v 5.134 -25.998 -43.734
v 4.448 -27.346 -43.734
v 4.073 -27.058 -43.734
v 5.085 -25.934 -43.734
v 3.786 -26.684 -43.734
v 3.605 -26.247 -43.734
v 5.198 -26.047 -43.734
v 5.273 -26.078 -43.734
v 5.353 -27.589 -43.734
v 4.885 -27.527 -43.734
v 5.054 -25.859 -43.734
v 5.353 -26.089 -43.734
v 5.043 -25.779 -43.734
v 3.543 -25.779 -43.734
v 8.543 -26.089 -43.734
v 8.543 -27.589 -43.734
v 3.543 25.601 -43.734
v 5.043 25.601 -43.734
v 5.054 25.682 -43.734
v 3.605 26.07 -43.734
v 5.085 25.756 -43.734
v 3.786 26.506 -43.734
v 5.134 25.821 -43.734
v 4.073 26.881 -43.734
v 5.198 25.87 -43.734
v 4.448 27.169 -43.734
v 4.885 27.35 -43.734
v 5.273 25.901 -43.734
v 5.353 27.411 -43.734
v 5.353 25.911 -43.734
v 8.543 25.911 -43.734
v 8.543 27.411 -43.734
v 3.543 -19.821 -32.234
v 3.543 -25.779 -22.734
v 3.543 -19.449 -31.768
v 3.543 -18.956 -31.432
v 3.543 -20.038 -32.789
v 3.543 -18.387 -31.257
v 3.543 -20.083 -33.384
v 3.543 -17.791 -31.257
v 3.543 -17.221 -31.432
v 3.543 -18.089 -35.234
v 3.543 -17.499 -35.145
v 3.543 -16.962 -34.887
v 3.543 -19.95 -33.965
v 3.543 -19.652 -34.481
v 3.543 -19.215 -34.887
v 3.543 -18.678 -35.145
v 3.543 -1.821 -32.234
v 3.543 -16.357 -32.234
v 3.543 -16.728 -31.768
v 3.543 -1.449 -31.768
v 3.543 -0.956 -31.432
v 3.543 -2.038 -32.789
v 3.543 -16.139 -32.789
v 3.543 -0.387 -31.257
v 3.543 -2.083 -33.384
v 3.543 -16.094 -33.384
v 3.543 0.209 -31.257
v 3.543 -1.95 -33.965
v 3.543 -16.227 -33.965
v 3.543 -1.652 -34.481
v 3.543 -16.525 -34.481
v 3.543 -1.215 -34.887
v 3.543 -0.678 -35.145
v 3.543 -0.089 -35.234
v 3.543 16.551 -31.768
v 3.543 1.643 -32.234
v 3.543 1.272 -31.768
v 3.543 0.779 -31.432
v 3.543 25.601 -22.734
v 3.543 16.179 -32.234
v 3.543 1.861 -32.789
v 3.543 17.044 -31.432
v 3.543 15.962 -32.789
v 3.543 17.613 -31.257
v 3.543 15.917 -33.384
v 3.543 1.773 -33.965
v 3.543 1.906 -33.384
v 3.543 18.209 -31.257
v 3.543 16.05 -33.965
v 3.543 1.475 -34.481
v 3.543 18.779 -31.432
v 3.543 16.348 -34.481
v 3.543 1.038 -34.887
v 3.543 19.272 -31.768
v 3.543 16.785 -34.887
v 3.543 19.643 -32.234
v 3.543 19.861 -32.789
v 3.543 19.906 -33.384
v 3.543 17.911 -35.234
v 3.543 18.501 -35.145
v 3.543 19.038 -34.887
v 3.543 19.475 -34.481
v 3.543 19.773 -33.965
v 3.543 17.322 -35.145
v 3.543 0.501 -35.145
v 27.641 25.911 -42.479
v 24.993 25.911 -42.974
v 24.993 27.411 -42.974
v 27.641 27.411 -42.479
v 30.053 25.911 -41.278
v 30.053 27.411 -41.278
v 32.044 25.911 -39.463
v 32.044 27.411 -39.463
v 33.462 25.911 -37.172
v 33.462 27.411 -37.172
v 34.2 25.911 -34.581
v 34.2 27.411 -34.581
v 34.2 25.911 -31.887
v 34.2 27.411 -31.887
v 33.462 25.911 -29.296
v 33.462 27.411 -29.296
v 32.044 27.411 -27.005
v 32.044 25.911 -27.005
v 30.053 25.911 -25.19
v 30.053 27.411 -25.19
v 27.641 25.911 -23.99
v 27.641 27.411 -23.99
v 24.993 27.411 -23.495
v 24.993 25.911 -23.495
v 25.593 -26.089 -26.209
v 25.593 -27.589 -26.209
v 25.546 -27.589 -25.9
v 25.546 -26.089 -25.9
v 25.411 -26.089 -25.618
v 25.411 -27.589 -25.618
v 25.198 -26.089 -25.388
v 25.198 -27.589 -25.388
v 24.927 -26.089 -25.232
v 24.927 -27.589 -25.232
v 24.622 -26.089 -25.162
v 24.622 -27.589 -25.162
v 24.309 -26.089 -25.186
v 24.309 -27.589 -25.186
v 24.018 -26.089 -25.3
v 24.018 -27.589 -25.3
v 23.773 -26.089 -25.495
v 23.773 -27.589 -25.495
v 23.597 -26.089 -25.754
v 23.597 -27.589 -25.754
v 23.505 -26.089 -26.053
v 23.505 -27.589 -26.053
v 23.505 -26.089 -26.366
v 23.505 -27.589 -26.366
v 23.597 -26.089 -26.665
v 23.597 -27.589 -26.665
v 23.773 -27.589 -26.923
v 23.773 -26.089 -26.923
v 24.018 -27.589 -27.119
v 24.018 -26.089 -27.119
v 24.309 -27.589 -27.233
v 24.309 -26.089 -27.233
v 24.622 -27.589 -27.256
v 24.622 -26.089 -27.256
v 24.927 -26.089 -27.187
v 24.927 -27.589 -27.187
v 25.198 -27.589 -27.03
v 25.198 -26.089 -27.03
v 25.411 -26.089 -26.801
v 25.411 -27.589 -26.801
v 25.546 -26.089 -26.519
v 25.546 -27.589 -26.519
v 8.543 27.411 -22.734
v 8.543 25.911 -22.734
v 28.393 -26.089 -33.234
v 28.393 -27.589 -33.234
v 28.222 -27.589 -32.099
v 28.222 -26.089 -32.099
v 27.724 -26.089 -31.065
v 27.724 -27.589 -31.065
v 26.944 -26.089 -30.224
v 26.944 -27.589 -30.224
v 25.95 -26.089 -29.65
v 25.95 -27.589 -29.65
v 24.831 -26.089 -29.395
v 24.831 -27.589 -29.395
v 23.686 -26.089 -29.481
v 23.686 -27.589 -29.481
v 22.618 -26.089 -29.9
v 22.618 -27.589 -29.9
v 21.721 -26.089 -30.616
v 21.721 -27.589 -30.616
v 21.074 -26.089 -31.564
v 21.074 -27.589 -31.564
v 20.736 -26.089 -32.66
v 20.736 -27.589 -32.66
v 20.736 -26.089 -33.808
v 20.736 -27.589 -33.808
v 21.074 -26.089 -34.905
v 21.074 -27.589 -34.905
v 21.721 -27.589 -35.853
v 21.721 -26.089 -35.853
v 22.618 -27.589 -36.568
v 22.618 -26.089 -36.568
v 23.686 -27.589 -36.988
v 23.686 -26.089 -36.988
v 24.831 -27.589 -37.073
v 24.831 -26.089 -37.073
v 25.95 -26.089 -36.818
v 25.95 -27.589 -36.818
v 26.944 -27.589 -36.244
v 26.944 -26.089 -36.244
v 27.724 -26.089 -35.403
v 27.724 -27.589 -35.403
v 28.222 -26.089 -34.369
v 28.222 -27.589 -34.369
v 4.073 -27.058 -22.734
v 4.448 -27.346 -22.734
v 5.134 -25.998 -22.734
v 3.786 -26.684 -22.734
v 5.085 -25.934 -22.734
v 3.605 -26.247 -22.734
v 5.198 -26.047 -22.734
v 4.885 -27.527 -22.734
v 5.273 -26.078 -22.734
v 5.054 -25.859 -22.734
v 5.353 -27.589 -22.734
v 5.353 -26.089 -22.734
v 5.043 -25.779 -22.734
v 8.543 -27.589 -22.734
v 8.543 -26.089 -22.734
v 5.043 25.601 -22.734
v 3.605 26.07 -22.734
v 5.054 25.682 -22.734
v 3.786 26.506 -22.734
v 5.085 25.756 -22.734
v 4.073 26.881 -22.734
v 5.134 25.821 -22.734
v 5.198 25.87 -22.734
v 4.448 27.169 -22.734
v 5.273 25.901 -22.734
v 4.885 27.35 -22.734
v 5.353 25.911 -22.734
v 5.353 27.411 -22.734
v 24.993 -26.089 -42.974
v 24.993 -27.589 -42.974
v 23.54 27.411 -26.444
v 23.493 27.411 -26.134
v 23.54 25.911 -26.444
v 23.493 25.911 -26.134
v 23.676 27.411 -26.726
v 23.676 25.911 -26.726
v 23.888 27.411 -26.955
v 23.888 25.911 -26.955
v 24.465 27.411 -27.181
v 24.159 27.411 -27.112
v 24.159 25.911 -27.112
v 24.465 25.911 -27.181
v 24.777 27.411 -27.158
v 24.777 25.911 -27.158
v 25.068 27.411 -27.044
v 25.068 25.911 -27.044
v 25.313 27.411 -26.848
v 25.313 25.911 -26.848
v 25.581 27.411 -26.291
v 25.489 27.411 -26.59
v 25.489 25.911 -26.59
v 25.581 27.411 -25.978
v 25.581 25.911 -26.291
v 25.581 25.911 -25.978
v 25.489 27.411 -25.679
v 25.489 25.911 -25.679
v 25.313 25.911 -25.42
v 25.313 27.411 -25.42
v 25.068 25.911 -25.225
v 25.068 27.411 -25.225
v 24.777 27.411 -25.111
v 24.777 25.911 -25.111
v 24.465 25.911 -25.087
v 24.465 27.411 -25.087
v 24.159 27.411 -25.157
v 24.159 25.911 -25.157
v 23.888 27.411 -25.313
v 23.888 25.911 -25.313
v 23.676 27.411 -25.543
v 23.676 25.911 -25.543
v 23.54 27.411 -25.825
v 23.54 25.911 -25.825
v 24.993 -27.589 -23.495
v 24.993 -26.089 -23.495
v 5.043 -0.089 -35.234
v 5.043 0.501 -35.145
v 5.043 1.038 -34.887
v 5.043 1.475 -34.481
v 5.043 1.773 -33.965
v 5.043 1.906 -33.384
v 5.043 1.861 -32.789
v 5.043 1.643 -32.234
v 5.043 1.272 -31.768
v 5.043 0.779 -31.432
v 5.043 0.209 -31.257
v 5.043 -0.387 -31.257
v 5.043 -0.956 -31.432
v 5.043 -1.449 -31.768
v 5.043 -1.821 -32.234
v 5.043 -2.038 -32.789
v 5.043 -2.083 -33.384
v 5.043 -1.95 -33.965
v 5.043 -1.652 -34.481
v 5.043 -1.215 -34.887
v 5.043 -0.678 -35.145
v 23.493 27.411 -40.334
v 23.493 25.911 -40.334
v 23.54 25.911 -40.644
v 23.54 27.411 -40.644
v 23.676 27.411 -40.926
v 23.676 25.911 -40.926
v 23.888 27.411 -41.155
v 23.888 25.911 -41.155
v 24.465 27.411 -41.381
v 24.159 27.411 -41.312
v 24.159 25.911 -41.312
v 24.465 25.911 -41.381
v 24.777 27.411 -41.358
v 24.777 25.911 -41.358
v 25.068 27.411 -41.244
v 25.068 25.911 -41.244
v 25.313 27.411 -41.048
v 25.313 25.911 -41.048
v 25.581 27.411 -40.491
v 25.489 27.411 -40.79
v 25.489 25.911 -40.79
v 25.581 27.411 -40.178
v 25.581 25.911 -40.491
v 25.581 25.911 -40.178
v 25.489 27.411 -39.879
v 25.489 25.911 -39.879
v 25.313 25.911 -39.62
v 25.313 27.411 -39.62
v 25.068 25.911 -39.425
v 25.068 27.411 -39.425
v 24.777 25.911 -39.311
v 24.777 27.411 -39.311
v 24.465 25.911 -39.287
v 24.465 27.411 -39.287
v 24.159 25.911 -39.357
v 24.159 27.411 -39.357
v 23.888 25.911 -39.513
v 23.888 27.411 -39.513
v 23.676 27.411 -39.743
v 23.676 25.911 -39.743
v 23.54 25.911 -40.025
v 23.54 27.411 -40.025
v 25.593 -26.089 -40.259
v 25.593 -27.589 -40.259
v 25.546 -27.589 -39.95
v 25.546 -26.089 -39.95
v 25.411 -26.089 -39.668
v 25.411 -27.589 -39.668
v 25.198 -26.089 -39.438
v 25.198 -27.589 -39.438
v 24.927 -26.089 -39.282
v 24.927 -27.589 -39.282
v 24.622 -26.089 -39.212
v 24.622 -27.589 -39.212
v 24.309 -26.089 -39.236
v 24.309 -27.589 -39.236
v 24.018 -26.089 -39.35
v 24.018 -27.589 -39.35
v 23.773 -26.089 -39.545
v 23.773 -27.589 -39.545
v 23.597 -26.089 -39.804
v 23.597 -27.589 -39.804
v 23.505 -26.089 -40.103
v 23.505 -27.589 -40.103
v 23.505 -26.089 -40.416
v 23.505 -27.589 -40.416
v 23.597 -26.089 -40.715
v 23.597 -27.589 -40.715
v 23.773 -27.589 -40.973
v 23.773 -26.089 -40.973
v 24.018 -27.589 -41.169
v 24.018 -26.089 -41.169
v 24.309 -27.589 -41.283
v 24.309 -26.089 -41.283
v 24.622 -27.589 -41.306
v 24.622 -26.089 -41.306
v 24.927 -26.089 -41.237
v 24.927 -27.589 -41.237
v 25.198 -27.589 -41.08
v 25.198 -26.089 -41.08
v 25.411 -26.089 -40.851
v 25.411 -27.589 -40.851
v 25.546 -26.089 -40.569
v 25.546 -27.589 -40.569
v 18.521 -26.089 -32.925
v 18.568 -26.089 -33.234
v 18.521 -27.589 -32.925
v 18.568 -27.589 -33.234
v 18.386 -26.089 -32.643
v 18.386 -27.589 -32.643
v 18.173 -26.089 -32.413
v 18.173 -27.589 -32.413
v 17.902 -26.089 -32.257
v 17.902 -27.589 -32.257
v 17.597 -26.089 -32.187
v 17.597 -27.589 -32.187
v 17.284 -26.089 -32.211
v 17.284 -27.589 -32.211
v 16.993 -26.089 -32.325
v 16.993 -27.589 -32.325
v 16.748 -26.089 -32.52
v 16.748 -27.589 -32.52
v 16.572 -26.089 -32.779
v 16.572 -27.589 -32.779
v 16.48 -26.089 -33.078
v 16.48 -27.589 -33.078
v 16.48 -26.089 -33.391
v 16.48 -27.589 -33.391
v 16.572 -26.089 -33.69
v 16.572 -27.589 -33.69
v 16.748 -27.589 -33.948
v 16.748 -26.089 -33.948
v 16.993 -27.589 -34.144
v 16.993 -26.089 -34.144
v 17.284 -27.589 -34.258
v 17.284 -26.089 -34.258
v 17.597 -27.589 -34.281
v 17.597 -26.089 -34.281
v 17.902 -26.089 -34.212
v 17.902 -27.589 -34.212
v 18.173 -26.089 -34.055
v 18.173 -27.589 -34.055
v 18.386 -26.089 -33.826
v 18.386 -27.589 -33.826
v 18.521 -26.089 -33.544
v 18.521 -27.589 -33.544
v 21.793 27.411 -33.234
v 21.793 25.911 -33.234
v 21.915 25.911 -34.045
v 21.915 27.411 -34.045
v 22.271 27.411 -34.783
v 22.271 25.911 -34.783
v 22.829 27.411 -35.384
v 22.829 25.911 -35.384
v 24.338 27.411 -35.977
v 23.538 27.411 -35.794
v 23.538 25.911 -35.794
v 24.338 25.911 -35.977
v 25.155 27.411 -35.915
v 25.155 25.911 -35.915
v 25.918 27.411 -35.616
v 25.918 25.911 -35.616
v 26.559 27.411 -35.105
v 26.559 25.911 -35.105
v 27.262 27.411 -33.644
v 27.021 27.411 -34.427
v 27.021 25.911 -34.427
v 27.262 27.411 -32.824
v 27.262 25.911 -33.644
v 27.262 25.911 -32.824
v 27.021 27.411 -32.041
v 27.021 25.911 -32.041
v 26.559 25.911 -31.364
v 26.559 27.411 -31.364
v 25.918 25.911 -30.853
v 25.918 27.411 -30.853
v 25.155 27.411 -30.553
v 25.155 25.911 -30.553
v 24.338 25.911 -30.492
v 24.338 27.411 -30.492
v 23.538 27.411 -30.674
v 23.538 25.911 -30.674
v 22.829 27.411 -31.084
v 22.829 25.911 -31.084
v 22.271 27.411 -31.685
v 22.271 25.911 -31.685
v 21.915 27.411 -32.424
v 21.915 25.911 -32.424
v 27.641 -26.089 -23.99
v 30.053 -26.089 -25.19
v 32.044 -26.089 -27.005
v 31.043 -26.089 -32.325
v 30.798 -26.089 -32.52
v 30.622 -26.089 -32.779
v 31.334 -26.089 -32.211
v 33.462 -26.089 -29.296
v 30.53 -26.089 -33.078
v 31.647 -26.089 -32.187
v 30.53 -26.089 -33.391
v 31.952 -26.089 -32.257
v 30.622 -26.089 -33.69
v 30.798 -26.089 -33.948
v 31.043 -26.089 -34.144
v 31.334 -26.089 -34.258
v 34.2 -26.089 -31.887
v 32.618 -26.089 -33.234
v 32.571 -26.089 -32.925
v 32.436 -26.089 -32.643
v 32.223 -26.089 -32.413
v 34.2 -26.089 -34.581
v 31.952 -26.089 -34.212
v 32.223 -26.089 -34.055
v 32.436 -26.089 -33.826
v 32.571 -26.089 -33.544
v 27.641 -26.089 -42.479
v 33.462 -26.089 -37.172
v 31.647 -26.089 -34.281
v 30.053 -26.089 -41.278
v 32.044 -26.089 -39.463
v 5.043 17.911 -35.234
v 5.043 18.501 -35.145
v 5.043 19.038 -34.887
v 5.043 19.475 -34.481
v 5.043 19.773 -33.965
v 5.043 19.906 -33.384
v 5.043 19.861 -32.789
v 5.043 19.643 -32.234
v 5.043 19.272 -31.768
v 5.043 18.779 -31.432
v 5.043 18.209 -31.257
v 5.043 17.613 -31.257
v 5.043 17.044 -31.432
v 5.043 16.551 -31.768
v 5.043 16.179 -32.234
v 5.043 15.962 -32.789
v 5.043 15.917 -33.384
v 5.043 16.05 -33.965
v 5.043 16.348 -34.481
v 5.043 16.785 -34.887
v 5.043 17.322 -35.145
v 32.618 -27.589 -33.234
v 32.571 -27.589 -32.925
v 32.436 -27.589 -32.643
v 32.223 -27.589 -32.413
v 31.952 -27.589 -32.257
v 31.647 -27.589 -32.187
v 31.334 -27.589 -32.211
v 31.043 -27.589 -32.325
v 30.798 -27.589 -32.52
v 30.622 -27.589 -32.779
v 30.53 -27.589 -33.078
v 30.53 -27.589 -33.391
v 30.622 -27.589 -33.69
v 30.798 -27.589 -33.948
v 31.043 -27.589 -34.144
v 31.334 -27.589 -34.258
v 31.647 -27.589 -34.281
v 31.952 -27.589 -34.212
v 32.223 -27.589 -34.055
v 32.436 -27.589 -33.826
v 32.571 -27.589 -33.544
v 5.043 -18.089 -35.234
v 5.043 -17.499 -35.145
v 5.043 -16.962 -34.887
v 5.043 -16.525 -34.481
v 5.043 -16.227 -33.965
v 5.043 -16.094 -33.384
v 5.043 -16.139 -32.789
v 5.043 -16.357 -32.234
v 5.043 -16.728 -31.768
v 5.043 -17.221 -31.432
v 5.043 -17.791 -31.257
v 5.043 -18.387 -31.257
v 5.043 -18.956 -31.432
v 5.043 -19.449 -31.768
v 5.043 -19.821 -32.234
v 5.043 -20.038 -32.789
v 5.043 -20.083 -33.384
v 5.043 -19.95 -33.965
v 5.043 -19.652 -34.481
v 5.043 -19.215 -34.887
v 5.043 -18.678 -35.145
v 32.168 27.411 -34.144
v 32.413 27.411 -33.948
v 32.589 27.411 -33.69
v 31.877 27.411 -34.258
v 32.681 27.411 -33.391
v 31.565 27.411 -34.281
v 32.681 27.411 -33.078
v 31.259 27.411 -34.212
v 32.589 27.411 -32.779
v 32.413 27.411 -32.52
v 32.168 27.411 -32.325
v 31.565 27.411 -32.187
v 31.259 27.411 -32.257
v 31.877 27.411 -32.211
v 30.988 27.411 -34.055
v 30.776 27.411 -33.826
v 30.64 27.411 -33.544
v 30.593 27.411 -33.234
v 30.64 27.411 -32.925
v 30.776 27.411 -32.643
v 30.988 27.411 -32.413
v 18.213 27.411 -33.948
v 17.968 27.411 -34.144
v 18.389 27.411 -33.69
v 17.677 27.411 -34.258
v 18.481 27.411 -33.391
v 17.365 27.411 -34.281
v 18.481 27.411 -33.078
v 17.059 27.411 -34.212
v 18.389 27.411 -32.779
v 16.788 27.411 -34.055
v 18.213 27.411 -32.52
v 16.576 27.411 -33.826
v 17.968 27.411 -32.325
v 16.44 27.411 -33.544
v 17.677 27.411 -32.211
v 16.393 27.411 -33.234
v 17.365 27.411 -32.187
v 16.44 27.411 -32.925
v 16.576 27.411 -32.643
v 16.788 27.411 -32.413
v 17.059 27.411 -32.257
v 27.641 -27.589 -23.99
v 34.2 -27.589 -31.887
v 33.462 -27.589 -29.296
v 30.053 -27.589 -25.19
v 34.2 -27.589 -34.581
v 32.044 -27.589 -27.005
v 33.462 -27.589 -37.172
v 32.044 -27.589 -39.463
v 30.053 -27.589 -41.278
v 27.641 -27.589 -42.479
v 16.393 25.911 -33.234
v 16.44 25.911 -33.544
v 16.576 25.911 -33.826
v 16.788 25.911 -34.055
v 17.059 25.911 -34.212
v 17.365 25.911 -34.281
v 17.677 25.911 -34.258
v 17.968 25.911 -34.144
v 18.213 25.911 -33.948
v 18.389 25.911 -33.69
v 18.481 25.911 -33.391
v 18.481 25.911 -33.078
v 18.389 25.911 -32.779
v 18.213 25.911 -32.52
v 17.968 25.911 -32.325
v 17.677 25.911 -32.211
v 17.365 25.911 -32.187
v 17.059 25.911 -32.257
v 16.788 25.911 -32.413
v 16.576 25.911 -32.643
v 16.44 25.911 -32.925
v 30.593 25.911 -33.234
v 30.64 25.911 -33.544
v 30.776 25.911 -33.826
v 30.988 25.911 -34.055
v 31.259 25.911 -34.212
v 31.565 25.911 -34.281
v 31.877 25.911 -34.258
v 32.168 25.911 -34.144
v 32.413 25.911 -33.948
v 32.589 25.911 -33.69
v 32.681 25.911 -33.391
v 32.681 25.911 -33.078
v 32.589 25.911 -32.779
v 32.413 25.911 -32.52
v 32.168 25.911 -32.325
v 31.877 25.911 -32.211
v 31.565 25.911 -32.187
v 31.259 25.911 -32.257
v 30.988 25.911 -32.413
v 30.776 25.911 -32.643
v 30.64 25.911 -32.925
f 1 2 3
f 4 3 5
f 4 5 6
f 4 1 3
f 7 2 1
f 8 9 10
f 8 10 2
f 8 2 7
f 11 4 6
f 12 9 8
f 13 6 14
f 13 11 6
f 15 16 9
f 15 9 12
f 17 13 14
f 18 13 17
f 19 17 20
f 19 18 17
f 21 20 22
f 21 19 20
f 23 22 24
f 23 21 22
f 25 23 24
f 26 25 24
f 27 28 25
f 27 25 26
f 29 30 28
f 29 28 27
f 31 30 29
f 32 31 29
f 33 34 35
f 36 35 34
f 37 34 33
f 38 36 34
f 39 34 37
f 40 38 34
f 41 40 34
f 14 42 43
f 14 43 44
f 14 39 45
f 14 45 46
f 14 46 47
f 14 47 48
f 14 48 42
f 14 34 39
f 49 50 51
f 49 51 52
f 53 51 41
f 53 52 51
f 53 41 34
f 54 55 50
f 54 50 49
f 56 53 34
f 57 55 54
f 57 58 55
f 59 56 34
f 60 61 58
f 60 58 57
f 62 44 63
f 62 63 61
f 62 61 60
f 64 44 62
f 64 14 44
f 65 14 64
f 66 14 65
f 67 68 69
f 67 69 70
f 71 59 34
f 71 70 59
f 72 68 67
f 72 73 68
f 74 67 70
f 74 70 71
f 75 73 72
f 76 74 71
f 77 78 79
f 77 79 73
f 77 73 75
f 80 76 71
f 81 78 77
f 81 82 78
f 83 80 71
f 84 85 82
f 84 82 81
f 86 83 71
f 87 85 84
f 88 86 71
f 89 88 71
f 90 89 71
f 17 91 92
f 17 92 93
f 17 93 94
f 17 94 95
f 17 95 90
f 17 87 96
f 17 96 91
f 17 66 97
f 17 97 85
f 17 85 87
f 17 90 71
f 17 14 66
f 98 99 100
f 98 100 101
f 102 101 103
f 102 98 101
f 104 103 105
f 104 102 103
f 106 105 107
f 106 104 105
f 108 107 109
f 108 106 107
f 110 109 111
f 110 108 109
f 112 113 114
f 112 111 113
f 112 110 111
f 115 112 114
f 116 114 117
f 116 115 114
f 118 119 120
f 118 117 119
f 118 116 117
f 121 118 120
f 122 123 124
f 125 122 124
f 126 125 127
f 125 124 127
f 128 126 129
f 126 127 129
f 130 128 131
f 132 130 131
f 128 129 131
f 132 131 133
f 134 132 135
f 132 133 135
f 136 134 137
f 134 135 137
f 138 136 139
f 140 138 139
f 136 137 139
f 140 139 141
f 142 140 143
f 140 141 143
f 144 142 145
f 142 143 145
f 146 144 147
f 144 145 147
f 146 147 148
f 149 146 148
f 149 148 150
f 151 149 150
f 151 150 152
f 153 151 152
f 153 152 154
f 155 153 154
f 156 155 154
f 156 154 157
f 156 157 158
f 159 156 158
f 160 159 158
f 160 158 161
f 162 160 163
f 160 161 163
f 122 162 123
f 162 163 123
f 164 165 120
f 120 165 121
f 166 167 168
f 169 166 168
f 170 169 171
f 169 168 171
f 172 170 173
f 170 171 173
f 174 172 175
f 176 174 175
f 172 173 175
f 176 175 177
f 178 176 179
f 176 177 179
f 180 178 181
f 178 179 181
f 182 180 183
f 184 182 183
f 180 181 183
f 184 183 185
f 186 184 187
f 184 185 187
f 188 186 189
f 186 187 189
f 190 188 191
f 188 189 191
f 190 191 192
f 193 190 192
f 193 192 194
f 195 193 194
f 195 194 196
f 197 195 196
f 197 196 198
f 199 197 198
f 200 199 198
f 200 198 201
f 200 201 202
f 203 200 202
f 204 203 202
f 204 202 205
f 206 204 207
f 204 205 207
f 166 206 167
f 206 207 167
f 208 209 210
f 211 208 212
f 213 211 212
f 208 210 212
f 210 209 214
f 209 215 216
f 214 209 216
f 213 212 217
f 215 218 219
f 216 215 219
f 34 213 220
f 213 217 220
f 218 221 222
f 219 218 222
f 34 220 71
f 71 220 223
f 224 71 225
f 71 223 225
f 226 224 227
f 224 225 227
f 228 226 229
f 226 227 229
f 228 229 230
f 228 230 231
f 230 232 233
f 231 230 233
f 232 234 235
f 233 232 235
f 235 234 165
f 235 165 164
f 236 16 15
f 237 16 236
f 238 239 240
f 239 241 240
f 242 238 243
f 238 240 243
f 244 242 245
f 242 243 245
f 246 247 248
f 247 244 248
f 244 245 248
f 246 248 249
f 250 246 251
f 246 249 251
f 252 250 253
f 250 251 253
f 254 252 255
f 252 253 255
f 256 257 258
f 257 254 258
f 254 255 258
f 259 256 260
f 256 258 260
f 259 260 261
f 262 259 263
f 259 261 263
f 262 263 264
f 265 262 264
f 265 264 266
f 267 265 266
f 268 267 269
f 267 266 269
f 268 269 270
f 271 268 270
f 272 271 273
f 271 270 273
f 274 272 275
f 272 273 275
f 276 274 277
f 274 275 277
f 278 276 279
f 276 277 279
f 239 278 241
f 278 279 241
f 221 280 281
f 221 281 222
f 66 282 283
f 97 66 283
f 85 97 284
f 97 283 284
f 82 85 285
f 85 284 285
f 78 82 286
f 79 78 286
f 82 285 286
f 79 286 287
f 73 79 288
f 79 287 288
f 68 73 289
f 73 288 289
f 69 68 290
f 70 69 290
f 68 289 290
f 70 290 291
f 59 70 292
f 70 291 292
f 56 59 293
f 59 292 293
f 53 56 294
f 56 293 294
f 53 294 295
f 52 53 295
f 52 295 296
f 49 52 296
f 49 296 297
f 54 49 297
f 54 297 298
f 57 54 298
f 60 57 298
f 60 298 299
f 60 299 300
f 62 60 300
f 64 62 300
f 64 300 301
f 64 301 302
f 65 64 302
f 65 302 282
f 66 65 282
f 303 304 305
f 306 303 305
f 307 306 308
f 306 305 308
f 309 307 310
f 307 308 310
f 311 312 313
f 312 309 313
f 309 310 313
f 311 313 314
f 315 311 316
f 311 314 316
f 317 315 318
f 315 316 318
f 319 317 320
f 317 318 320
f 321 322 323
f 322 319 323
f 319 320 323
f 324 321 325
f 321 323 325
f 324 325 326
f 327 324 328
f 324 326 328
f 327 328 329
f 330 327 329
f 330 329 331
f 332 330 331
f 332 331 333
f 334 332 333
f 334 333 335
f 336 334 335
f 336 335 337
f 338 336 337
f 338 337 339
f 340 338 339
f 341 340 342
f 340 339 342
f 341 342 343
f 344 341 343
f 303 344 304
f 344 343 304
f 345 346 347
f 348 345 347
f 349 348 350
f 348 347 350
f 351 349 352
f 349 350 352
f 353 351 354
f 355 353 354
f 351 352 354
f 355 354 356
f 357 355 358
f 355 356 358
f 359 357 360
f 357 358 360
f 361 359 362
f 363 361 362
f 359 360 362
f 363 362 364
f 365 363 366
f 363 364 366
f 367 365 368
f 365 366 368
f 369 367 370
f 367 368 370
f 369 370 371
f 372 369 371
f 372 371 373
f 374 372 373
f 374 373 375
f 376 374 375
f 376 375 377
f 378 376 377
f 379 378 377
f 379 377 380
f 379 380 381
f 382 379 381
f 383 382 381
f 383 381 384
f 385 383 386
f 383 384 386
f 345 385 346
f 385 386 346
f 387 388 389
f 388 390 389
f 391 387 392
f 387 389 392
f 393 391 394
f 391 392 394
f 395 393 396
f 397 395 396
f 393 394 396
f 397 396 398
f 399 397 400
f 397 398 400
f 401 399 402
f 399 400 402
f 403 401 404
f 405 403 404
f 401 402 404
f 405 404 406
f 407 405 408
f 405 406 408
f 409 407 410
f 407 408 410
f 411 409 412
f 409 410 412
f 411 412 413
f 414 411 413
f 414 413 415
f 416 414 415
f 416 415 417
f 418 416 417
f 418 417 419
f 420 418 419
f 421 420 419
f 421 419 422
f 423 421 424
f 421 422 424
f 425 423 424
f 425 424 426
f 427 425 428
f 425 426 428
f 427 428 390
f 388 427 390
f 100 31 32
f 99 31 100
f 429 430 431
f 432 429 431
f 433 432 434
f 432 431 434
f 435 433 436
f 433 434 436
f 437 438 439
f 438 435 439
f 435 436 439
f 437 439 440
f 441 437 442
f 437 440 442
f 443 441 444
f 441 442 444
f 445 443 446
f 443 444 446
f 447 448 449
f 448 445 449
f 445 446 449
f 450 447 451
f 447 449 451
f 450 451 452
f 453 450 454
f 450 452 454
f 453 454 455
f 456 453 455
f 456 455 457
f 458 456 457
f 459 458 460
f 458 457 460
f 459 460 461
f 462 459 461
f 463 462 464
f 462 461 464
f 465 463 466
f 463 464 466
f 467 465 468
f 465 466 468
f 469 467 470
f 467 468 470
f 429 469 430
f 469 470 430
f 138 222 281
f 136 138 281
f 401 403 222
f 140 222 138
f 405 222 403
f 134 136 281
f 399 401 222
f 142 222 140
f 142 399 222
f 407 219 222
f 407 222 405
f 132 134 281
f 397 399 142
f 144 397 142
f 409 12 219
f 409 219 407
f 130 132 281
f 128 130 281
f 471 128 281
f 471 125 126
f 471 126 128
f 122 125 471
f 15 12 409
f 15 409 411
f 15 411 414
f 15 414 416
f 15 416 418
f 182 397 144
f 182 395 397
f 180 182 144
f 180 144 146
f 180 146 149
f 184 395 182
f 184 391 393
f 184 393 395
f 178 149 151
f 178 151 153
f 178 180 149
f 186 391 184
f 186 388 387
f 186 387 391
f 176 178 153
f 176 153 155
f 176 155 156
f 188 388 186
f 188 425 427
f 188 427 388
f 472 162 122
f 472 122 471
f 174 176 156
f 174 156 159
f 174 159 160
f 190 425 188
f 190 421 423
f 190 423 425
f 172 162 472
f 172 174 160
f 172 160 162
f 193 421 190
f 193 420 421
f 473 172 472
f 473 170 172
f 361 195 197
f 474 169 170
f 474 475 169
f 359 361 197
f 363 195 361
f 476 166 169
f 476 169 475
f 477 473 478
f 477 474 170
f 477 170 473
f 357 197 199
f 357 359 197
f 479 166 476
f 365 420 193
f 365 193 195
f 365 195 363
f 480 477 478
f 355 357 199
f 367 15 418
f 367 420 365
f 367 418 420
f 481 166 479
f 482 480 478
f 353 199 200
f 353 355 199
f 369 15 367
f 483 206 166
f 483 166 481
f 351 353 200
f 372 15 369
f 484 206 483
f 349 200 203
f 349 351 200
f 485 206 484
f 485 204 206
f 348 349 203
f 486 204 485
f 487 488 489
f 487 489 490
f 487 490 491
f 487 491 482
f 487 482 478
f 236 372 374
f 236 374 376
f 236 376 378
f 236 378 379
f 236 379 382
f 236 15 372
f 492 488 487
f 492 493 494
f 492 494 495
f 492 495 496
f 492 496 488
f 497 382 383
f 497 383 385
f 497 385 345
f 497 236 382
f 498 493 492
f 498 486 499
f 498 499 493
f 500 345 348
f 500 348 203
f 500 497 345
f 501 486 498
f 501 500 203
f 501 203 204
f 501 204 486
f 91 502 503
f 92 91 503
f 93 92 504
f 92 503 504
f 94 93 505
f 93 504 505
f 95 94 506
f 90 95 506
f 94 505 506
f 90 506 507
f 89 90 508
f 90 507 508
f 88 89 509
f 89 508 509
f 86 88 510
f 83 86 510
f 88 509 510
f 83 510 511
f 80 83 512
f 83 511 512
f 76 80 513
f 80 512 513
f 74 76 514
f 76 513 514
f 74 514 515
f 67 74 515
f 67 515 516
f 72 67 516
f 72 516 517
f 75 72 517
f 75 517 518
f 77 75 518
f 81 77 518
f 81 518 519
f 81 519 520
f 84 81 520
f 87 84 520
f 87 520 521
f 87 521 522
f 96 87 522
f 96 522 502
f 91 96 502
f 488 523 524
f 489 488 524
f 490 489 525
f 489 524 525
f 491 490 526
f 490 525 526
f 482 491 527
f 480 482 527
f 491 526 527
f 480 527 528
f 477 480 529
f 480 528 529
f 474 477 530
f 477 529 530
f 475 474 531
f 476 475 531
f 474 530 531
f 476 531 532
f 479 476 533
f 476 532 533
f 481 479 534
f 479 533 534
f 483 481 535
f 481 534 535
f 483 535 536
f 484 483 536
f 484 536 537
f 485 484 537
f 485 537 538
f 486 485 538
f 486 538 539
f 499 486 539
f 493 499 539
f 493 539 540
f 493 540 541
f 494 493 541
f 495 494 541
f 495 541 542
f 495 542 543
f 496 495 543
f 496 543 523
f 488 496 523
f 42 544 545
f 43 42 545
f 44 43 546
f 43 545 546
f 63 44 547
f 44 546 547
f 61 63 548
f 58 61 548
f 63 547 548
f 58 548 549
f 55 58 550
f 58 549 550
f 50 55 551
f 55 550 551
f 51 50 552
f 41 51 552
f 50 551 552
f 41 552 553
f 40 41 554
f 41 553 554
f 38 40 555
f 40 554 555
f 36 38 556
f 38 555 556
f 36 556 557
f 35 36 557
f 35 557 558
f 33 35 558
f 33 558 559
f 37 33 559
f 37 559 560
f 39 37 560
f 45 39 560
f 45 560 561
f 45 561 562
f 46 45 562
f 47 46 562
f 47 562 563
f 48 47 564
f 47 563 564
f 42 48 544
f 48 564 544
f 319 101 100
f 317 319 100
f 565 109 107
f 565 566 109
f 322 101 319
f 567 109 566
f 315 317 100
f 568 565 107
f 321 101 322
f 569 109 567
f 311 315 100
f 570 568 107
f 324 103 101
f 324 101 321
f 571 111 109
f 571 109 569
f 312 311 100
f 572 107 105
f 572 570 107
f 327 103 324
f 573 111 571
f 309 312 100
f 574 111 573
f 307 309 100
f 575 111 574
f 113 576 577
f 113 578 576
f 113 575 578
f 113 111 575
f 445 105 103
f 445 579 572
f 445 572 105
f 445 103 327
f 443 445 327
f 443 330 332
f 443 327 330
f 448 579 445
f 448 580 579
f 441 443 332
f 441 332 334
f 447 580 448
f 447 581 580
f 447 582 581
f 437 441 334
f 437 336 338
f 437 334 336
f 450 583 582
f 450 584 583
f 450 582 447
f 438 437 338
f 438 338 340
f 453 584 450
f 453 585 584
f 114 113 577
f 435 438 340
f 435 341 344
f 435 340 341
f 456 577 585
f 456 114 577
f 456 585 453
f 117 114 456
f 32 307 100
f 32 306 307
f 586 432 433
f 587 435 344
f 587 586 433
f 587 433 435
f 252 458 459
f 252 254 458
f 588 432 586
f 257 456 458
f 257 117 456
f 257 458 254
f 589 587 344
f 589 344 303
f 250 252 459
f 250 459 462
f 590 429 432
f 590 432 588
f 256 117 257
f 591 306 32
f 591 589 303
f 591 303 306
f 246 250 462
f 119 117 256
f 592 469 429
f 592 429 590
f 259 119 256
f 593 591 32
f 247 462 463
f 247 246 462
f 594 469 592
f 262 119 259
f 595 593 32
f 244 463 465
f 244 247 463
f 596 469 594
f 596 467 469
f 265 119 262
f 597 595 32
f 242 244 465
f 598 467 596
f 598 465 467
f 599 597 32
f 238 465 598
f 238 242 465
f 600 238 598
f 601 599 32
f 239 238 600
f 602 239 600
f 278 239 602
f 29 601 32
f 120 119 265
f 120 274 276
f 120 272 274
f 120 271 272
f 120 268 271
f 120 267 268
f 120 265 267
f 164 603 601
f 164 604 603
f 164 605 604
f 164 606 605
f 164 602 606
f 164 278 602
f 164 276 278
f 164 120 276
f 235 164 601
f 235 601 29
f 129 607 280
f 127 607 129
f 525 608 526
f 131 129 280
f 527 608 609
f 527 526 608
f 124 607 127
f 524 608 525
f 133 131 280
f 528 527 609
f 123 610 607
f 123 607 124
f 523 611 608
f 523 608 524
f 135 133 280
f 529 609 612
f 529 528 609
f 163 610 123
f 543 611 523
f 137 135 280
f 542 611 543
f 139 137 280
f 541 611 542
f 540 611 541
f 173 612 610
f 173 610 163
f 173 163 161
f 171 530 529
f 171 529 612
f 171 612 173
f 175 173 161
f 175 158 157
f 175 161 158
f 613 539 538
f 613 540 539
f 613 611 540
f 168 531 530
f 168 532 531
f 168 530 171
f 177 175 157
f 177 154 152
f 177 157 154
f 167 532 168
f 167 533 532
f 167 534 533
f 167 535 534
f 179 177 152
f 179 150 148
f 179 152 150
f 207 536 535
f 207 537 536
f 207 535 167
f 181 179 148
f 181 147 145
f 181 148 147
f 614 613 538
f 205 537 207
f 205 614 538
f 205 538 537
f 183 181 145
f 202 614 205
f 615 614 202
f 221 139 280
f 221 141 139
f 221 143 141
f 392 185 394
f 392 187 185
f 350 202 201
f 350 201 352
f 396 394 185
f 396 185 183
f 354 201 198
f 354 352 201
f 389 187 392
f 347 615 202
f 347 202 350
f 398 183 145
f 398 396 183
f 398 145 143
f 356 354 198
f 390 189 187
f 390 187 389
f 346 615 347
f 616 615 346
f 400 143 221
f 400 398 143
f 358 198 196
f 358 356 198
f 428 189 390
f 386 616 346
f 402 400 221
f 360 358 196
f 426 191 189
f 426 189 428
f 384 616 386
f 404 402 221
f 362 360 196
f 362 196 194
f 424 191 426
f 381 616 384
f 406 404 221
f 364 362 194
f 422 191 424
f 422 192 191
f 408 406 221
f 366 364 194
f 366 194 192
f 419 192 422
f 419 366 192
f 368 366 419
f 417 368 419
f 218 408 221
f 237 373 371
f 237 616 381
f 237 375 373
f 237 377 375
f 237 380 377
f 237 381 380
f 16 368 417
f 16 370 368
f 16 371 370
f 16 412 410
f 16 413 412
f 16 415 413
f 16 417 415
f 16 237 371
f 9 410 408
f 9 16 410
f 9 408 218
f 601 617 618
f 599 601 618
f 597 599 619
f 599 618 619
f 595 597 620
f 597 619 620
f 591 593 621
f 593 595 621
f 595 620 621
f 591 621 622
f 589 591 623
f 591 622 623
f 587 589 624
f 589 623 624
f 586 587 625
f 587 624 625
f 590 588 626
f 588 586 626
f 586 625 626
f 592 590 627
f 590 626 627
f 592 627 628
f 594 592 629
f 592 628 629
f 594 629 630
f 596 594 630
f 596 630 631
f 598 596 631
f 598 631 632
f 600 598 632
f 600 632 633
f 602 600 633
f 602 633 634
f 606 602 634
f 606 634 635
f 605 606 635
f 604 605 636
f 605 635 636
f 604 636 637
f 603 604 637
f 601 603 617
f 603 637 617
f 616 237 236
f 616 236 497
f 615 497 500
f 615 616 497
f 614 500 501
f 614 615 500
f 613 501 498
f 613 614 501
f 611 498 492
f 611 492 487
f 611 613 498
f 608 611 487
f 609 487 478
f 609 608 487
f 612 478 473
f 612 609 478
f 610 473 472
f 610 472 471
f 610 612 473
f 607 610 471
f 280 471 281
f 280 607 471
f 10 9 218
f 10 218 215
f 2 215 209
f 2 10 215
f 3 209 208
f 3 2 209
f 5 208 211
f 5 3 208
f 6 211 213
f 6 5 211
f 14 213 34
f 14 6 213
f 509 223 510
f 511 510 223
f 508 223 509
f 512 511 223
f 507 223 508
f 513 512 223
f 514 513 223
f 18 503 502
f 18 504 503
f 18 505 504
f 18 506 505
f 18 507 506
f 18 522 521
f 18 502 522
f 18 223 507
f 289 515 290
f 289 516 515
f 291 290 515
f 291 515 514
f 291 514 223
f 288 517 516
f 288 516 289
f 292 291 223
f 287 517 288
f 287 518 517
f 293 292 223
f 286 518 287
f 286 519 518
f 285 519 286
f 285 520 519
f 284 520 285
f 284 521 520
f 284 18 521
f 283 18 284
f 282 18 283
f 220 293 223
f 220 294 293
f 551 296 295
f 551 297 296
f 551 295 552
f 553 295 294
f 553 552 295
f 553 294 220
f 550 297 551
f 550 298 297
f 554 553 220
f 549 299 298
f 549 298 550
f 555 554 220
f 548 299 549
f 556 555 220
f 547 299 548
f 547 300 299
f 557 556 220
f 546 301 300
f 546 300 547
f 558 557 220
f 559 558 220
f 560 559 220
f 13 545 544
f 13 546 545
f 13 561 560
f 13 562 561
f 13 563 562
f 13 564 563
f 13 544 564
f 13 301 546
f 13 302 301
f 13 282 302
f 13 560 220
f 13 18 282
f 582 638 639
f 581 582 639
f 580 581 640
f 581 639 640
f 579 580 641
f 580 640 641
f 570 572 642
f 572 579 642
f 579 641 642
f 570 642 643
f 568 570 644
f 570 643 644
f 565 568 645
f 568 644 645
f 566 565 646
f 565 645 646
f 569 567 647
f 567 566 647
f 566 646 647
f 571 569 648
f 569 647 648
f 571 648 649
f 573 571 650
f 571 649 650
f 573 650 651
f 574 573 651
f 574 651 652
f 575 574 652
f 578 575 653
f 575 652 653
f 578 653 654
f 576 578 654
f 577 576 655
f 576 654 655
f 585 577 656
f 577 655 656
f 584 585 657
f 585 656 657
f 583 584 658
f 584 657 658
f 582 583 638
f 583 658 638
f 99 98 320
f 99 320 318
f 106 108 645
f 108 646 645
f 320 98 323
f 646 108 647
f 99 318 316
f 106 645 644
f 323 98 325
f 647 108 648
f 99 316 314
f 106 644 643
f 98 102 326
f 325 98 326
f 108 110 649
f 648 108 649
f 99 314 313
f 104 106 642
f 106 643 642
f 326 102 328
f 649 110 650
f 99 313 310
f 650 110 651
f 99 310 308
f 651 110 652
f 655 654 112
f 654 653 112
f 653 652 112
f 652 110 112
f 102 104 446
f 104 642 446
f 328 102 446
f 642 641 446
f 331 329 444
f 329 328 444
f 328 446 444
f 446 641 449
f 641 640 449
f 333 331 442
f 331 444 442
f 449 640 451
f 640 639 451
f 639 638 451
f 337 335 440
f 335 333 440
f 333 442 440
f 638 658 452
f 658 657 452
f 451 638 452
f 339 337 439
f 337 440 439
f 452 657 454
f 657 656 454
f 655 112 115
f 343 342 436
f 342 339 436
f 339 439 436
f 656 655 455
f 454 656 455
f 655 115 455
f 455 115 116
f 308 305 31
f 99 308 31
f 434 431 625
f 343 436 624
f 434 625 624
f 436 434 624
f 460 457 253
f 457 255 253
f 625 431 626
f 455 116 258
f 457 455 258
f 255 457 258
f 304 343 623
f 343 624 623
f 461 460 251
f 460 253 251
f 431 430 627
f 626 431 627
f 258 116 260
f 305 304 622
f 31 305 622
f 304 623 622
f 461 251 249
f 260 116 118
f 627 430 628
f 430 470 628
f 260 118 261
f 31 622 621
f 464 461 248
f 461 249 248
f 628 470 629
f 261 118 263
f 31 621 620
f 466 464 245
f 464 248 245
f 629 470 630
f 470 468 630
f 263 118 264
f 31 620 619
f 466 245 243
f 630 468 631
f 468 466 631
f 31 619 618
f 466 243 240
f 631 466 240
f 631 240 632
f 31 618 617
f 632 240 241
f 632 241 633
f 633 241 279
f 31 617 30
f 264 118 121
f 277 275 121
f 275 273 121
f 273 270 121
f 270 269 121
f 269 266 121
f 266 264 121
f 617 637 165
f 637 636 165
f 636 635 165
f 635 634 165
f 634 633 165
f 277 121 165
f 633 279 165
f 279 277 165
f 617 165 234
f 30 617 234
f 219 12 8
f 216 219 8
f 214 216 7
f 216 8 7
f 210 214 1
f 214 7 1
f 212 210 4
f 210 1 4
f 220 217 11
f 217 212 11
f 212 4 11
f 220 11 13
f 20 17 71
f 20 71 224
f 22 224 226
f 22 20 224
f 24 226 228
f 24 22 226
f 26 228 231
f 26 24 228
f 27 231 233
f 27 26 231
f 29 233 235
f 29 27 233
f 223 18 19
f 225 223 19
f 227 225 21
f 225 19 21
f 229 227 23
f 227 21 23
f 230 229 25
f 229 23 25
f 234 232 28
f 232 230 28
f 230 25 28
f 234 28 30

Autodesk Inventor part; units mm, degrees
ref_plane "YZ Plane" through (0, 0, 0) normal (1, 0, 0) x (0, 1, 0)
ref_plane "Work Plane1" through (34.2931, 25.9114, -33.2342) normal (0, 1, 0) x (-1, 0, 0)
sketch "Sketch2" plane through (34.2931, 25.9114, -33.2342) normal (0, 1, 0) x (-1, 0, 0)
  circle A0 centre (9.75, 7.1) radius 0.7835
  circle A1 centre (16.85, 0) radius 0.7835
  circle A2 centre (9.75, -7.1) radius 0.7835
  circle A3 centre (2.65, 0) radius 0.7835
  circle A4 centre (4.7295, -5.0205) radius 0.7835
  circle A5 centre (14.7705, -5.0205) radius 0.7835
  circle A6 centre (14.7705, 5.0205) radius 0.7835
  circle A7 centre (4.7295, 5.0205) radius 0.7835
  circle A8 centre (9.75, 0) radius 3.8
  circle A9 centre (9.75, 0) radius 9.75
  circle A10 centre (9.75, 0) radius 2.75
  line L0 (30.75, -10.5) -> (30.75, 10.5)
  line L1 (30.75, -10.5) -> (25.75, -10.5)
  line L2 (30.75, 10.5) -> (25.75, 10.5)
  line L3 (25.75, -10.5) -> (9.2998, -9.7396)
  line L4 (25.75, 10.5) -> (9.2998, 9.7396)
  circle A11 centre (16.85, 0) radius 1.05
  circle A12 centre (9.75, 7.1) radius 1.05
  circle A13 centre (2.65, 0) radius 1.05
  circle A14 centre (9.75, -7.1) radius 1.05
  point P0 (34.2931, 33.2342)
  point P1 (30.75, 0)
  dimension "d2" = 5.5
  dimension "d4" = 21
  dimension "d5" = 5
  dimension "d6" = 21
  dimension "d37" = 2.1
extrude "Plate2" add sketch "Sketch2" along normal blind 1.5 contours A4 | A5 | A6 | A7 | A8 | A9 | A9 L4 L2 L0 L1 L3
sketch "Sketch3" plane through (5.0431, 27.4114, -43.7342) normal (-1, 0, 0) x (0, -1, 0)
  line L0 (0, 21) -> (0, 0)
  line L1 (0, 0) -> (55, 0)
  line L2 (55, 0) -> (55, 21)
  line L3 (55, 21) -> (0, 21)
edge flange "Flange1" height 55 angle 90 thickness 1.5 bend radius 0.31 thickness toward (-1, 0, 0) relief tear relief width 1.5 relief depth 0.75 edges at (3.5431, 25.9114, -33.2342) wall of the first edge with corners at (5.0431, 27.4114, -22.7342) (5.0431, 27.4114, -43.7342) (5.0431, -27.5886, -43.7342) (5.0431, -27.5886, -22.7342)
bend "Bend1"
corner "Corner1"
sketch "Sketch4" plane through (3.5431, -26.0886, -43.7342) normal (0, -1, 0) x (1, 0, 0)
  line L0 (0, 21) -> (0, 0)
  line L1 (0, 0) -> (35, 0)
  line L2 (35, 0) -> (35, 21)
  line L3 (35, 21) -> (0, 21)
edge flange "Flange2" height 35 angle 90 thickness 1.5 bend radius 0.31 thickness toward (0, -1, 0) relief tear relief width 1.5 relief depth 0.75 edges at (5.0431, -27.5886, -33.2342) wall of the first edge with corners at (3.5431, -26.0886, -22.7342) (3.5431, -26.0886, -43.7342) (38.5431, -26.0886, -43.7342) (38.5431, -26.0886, -22.7342)
bend "Bend2"
corner "Corner2"
sketch "Sketch5" plane through (38.5431, -27.5886, -43.7342) normal (0, -1, 0) x (1, 0, 0)
  circle A0 centre (-14, 10.5) radius 3.85 projected
  point P0 (-38.5431, 43.7342)
extrude "Cut1" cut sketch "Sketch5" against normal blind 1.5
sketch "Sketch6" plane through (38.5431, -27.5886, -43.7342) normal (0, -1, 0) x (1, 0, 0)
  line L0 (-33.19, 0) -> (-33.19, 21) projected
  line L1 (-30, 21) -> (-33.19, 21) projected
  line L2 (-13.5498, 20.2396) -> (-30, 21) projected
  arc A0 (-13.5498, 0.7604) -> (-13.5498, 20.2396) centre (-14, 10.5) ccw projected
  line L3 (-30, 0) -> (-13.5498, 0.7604) projected
  line L4 (-33.19, 0) -> (-30, 0) projected
  line L5 (-90, -199.5) -> (-90, 50.5) projected
  line L6 (220, -199.5) -> (-90, -199.5) projected
  circle A1 centre (-14, 17.525) radius 0.7835 projected
  circle A2 centre (-6.975, 10.5) radius 0.7835 projected
  circle A3 centre (-14, 3.475) radius 0.7835 projected
  circle A4 centre (-21.025, 10.5) radius 0.7835 projected
  circle A5 centre (-6.975, 10.5) radius 1.05
  circle A6 centre (-14, 17.525) radius 1.05
  circle A7 centre (-21.025, 10.5) radius 1.05
  circle A8 centre (-14, 3.475) radius 1.05
  line L7 (-33.19, 21) -> (0, 21) projected
  line L8 (0, 21) -> (0, 0) projected
  line L9 (0, 0) -> (-33.19, 0) projected
  line L10 (220, -199.5) -> (220, 50.5) projected
  line L11 (220, 50.5) -> (-90, 50.5) projected
  point P0 (-38.5431, 43.7342)
  dimension "d38" = 2.1
extrude "Cut2" cut sketch "Sketch6" against normal blind 1.5 contours L3 A0 L2 L7 L8 L9 | A1 | A2 | A3 | A4 | A5 | A6 | A7 | A8
ref_plane "작업 평면2" through (3.5431, 25.6014, -33.2342) normal (0, 0, 1) x (1, 0, 0)
sketch "Sketch7" plane through (5.0431, 25.6014, -22.7342) normal (1, 0, 0) x (0, 0, -1)
  line L0 (0, -51.38) -> (21, -51.38) projected
  line L1 (21, 0) -> (21, -51.38) projected
  line L2 (21, 0) -> (0, 0) projected
  line L3 (0, 0) -> (0, -51.38) projected
  line L4 (10.5, 0) -> (10.5, -51.38) construction
  circle A0 centre (10.5, -25.69) radius 2
  circle A1 centre (10.5, -7.69) radius 2
  circle A2 centre (10.5, -43.69) radius 2
  point P0 (-22.7342, -25.6014)
  dimension "d32" = 18
  dimension "d33" = 18
  dimension "d34" = 4
extrude "Cut3" cut sketch "Sketch7" against normal blind 1.5 contours A0 | A1 | A2
equation "\"d28\" = Thickness"
equation "\"d30\" = Thickness"
equation "\"d33\" = d32"
equation "\"d35\" = Thickness"
equation "\"d7\" = Thickness"
equation "\"d8\" = BendReliefWidth"
equation "\"d9\" = BendReliefDepth"
equation "\"d10\" = MinimumRemnant"
equation "\"d11\" = TransitionRadius"
equation "\"d14\" = BendRadius"
equation "\"d15\" = CornerReliefSize"
equation "\"d16\" = GapSize"
equation "\"d17\" = JacobiRadiusSize"
equation "\"d18\" = BendReliefWidth"
equation "\"d19\" = BendReliefDepth"
equation "\"d20\" = MinimumRemnant"
equation "\"d21\" = TransitionRadius"
equation "\"d24\" = BendRadius"
equation "\"d25\" = CornerReliefSize"
equation "\"d26\" = GapSize"
equation "\"d27\" = JacobiRadiusSize"
equation "\"BendReliefWidth\" = Thickness"
equation "\"BendReliefDepth\" = 0.5 * Thickness"
equation "\"CornerReliefSize\" = 4 * Thickness"
equation "\"MinimumRemnant\" = 2 * Thickness"
equation "\"TransitionRadius\" = BendRadius"
equation "\"JacobiRadiusSize\" = BendRadius"
equation "\"GapSize\" = Thickness"
equation "\"Thickness\" = 1.5"
equation "\"BendRadius\" = 0.31"
properties part number "ㄷ_frame_1" material "Aluminum 6061"
